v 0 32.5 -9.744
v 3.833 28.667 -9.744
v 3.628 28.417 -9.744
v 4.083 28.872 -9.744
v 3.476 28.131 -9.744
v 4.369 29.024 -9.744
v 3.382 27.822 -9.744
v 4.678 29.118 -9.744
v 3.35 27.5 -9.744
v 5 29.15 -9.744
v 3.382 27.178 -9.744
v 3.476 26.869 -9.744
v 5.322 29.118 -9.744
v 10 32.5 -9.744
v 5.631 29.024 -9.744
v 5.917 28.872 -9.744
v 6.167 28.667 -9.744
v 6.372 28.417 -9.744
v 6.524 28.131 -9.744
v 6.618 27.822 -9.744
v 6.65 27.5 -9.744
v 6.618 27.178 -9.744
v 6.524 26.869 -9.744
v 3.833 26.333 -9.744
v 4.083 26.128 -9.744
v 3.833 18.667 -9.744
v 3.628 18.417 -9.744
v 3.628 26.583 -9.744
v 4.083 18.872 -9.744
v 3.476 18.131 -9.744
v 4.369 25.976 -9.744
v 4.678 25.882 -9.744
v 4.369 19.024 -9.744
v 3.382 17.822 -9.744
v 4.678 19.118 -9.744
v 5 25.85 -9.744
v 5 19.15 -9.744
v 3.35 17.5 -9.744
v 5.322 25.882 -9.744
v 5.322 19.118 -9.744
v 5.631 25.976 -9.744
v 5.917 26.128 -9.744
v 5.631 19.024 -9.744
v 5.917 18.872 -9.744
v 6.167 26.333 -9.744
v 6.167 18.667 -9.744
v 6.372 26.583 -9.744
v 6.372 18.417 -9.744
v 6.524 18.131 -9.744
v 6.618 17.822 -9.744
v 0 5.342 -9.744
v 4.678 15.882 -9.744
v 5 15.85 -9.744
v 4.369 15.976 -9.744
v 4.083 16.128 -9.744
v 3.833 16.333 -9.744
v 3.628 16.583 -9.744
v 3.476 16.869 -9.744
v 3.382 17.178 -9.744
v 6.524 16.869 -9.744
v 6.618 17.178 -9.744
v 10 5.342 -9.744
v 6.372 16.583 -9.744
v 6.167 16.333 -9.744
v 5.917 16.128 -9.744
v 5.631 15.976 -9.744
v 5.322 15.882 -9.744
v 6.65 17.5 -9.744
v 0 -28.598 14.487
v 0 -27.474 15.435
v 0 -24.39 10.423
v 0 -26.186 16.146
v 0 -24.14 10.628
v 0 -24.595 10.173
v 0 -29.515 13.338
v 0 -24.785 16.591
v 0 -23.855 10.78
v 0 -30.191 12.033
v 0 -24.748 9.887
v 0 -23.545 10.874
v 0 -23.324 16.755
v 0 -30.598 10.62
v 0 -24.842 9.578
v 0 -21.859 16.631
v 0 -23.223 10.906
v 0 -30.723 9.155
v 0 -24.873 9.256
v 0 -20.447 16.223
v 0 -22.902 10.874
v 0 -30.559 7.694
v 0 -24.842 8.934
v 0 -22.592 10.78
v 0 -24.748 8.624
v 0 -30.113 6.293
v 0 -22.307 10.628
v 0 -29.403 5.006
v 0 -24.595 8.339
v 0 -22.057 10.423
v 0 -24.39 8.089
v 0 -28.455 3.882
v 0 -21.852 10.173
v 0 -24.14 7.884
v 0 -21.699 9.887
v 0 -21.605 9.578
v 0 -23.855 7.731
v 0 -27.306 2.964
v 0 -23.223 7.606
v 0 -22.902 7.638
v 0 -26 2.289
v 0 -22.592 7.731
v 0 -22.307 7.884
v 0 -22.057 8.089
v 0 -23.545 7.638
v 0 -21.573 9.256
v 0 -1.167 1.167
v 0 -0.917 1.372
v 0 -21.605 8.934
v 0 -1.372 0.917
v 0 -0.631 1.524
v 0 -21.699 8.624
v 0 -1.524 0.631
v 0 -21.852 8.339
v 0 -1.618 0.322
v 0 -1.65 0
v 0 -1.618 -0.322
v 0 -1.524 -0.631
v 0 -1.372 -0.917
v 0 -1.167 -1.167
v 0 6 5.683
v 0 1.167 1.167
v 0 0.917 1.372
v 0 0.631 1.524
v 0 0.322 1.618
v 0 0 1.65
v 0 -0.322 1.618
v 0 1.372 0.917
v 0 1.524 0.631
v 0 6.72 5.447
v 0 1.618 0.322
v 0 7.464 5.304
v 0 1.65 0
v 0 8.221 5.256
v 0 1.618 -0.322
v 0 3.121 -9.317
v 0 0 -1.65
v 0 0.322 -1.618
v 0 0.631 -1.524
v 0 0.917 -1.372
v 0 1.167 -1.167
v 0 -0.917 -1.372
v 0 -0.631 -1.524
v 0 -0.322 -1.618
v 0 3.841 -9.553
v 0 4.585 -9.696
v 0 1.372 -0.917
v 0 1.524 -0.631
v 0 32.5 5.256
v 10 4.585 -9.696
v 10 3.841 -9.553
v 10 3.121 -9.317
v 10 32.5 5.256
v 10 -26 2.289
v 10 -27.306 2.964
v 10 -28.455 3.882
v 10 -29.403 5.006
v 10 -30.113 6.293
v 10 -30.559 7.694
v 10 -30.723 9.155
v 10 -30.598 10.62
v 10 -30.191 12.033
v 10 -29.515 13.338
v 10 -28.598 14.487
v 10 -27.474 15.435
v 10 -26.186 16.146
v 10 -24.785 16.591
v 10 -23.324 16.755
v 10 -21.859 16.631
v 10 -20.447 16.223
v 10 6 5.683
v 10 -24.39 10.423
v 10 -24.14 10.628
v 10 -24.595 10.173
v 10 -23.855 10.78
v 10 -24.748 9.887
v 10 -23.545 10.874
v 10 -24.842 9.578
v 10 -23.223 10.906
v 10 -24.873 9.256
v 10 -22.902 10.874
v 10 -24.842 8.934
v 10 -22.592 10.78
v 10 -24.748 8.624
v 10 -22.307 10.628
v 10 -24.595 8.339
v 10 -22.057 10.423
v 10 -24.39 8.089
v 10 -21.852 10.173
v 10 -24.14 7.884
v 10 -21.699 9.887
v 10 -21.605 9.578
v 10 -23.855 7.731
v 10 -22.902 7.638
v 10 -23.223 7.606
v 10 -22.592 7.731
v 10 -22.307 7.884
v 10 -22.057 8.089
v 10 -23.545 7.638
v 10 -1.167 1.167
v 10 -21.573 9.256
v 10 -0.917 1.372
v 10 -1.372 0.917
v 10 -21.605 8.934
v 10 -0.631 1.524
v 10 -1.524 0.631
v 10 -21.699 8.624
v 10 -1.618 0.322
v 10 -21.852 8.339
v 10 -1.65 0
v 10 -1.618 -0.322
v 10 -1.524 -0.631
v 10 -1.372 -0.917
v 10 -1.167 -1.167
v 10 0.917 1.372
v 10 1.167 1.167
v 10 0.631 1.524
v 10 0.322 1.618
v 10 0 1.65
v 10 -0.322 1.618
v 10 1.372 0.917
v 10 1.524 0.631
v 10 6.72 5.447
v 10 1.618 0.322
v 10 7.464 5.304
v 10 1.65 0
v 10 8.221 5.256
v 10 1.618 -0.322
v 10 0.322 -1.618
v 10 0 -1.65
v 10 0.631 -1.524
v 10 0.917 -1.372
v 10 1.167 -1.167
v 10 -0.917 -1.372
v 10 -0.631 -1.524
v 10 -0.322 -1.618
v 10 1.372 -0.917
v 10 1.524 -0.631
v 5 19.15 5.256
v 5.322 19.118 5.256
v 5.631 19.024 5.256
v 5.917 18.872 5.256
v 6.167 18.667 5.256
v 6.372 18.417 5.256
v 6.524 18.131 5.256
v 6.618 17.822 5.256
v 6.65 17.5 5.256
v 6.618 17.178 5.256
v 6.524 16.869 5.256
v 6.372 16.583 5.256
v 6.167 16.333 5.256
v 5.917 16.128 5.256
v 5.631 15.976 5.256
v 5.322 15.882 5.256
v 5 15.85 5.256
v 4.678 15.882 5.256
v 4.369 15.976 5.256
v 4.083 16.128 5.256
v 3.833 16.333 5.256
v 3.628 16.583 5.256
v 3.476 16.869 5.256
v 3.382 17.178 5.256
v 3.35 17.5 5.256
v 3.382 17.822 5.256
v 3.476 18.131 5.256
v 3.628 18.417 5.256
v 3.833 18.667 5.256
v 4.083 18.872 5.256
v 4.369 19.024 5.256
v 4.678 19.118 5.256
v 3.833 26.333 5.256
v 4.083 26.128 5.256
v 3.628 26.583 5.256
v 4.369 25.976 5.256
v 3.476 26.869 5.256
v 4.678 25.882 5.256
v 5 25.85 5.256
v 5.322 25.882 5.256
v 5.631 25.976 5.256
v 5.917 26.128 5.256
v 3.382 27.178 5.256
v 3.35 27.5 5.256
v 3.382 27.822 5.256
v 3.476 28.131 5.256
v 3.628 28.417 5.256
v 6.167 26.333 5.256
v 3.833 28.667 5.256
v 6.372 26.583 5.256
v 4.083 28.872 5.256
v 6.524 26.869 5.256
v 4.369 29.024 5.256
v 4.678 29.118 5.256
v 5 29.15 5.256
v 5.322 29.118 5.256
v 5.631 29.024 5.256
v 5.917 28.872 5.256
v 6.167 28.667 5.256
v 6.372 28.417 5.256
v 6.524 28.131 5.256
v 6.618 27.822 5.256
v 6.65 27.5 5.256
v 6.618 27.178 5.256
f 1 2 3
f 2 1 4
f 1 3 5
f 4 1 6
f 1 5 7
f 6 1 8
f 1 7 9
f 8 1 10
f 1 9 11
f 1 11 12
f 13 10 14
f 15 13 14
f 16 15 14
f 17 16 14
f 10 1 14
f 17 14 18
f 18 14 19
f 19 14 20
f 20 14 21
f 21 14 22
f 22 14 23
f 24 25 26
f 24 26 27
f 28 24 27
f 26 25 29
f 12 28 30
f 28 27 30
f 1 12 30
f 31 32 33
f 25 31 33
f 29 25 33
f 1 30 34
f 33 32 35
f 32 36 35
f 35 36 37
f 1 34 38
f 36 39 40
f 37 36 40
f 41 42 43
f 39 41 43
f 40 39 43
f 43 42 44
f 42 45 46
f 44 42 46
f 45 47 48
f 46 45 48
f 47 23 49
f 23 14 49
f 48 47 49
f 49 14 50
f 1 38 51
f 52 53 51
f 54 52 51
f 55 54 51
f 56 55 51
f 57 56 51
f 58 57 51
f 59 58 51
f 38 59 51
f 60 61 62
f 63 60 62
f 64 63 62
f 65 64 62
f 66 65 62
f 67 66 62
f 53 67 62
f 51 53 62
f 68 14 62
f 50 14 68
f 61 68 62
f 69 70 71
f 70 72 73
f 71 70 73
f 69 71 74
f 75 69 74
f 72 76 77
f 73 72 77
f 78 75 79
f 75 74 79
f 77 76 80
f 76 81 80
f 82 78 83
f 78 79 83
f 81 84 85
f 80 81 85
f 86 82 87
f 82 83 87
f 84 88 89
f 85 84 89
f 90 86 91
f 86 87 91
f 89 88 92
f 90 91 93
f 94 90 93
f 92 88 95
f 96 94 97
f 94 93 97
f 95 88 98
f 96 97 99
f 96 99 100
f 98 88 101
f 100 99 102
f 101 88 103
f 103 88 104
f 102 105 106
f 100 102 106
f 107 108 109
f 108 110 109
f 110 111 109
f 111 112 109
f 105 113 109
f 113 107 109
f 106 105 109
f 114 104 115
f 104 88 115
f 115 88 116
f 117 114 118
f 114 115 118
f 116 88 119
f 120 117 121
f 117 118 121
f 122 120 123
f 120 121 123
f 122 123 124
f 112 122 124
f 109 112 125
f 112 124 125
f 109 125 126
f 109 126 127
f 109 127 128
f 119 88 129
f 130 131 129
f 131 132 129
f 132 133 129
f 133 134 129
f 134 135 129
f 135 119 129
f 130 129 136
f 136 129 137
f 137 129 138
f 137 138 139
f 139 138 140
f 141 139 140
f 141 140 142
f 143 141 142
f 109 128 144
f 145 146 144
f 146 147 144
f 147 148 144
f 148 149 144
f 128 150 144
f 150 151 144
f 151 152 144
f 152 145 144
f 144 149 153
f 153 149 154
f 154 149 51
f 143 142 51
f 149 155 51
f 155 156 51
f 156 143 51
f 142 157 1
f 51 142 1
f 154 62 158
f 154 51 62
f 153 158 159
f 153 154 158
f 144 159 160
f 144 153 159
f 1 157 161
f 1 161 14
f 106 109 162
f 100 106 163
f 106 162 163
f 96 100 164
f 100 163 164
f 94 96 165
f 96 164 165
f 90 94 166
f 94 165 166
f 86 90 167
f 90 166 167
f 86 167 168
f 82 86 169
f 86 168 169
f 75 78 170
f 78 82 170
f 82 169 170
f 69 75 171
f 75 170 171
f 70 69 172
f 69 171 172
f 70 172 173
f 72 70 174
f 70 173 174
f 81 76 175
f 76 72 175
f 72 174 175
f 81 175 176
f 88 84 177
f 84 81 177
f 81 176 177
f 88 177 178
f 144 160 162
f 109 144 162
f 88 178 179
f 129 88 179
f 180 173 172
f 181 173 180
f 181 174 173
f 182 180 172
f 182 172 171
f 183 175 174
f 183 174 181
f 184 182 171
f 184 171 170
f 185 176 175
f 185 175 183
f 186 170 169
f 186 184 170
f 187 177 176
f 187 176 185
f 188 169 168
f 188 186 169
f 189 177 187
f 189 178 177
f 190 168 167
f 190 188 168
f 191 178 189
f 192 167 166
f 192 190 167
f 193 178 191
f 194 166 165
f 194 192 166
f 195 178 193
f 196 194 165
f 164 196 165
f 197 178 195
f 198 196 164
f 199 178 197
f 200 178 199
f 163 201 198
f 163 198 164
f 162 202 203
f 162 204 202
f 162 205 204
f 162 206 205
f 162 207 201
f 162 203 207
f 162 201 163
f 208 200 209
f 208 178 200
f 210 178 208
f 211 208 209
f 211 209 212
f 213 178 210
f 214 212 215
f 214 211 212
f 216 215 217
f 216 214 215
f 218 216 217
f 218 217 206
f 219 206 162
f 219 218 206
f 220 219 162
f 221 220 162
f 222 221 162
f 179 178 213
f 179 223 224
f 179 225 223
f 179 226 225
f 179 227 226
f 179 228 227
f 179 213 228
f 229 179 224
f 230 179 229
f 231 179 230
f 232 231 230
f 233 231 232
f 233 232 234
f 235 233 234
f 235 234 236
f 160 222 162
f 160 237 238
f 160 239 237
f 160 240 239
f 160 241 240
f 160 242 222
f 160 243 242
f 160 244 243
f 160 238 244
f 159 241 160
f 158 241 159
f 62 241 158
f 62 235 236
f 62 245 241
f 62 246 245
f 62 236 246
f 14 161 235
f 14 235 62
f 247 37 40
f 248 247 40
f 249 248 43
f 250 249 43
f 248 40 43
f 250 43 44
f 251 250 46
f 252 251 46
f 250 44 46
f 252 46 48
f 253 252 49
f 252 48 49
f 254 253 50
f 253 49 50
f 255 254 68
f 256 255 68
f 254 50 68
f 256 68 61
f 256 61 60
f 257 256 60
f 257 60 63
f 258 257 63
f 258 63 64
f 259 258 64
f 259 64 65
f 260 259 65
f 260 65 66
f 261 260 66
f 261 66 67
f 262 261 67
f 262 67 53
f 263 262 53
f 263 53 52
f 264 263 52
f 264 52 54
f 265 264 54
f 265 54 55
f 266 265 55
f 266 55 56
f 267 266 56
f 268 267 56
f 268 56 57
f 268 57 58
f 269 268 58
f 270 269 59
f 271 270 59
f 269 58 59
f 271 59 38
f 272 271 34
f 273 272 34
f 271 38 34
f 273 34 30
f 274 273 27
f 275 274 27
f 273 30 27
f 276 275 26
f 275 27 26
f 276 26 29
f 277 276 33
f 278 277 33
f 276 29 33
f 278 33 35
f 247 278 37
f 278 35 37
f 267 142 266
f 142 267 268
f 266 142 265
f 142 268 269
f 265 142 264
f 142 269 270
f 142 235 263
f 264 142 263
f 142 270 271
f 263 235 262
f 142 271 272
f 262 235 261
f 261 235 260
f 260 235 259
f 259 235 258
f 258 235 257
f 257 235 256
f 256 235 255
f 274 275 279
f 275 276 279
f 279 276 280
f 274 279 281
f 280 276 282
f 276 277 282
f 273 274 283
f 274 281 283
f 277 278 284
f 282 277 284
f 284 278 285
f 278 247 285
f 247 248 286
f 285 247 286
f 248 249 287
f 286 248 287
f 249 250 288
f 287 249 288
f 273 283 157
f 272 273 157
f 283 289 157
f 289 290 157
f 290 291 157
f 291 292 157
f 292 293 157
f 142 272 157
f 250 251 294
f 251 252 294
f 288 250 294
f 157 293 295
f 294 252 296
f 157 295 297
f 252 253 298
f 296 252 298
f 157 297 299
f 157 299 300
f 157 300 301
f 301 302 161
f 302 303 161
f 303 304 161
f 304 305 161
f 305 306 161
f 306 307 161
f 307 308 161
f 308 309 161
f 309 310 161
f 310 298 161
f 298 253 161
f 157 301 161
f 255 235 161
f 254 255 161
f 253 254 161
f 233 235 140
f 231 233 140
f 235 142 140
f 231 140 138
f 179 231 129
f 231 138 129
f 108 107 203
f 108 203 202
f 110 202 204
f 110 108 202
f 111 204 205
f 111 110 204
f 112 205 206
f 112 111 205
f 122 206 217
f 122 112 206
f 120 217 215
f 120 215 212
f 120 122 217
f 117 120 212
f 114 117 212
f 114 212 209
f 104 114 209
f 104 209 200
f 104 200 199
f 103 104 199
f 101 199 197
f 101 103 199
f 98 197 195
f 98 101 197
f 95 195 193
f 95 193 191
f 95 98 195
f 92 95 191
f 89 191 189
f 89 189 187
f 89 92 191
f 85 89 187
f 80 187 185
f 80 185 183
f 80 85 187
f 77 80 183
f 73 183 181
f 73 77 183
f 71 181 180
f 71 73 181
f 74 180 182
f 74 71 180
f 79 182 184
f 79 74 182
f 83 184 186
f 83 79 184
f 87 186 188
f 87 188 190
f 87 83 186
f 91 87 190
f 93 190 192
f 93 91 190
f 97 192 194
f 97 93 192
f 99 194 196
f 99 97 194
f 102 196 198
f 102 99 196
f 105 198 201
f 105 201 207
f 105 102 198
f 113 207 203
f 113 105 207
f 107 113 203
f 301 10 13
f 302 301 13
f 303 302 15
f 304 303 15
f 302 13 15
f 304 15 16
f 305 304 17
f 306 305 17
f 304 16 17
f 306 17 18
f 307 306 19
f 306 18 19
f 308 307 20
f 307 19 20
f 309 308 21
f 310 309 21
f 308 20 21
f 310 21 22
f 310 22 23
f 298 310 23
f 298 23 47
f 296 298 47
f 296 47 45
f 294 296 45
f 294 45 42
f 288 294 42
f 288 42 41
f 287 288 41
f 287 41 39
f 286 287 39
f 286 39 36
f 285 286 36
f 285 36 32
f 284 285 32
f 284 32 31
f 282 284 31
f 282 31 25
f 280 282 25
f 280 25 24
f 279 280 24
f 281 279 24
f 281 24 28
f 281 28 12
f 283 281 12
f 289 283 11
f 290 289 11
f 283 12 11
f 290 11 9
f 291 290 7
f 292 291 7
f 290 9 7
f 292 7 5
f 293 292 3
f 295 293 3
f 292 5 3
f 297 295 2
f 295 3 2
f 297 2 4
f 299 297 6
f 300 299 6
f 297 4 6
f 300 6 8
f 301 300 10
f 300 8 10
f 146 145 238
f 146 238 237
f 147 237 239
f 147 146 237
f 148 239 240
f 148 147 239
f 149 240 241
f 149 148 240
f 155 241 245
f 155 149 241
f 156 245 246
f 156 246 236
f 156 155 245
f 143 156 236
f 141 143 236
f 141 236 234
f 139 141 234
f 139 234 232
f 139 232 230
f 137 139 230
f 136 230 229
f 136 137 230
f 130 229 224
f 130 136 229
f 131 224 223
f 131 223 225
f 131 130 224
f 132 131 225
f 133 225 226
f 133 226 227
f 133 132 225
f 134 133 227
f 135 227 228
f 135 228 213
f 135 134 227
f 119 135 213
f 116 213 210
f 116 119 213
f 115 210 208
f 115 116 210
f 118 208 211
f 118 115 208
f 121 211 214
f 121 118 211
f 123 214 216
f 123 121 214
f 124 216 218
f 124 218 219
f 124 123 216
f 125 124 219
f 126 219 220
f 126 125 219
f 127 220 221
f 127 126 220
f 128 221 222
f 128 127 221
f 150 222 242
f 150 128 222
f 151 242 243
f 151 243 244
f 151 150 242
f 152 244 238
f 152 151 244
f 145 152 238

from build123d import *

# Parameters (mm, degrees)
SKETCH_1_W          = 64.494727868
SKETCH_1_H          = 65
SKETCH_1_R          = 1.65
EXTRUDE_1_DEPTH     = 10
SKETCH_2_R          = 1.65
CUT_EXTRUDE_1_DEPTH = 47.863018263
SKETCH_3_R          = 1.65
CUT_EXTRUDE_2_DEPTH = 44.110090197
FILLET_1_R          = 6


with BuildPart() as part:
    # ｽｹｯﾁ1 → ﾎﾞｽ - 押し出し1 (new body)
    with BuildSketch(Plane(origin=(0, 0, 0), x_dir=(0, 0, -1), z_dir=(1, 0, 0))):
        Rectangle(SKETCH_1_W, SKETCH_1_H)
        Circle(SKETCH_1_R, mode=Mode.SUBTRACT)
        with Locations((-9.255829981, -23.223471131)):
            Circle(SKETCH_1_R, mode=Mode.SUBTRACT)
        with Locations((-22.247363934, -11.404157049)):
            Circle(SKETCH_1_R, mode=Mode.SUBTRACT)
    extrude(amount=EXTRUDE_1_DEPTH)

    # ｽｹｯﾁ2 → ｶｯﾄ - 押し出し1 (cut, through all)
    with BuildSketch(Plane(origin=(10, 0, 0), x_dir=(0, 0, -1), z_dir=(1, 0, 0))):
        with BuildLine():
            Line((9.743790334, 32.5), (9.743790334, 4.190292345))
            Line((9.743790334, 4.190292345), (-2.288788642, -26.000220125))
            ThreePointArc((-2.288788642, -26.000220125), (-12.032578975, -30.19051247), (-16.22287132, -20.446722136))
            Line((-16.22287132, -20.446722136), (-5.256209666, 7.069335401))
            Line((-5.256209666, 7.069335401), (-5.256209666, 32.5))
            Line((-5.256209666, 32.5), (-32.247363934, 32.5))
            Line((-32.247363934, 32.5), (-32.247363934, -32.5))
            Line((-32.247363934, -32.5), (32.247363934, -32.5))
            Line((32.247363934, -32.5), (32.247363934, 32.5))
            Line((32.247363934, 32.5), (9.743790334, 32.5))
        make_face()
        with Locations((-22.247363934, -11.404157049)):
            Circle(SKETCH_2_R, mode=Mode.SUBTRACT)
    extrude(amount=-CUT_EXTRUDE_1_DEPTH, mode=Mode.SUBTRACT)

    # ｽｹｯﾁ3 → ｶｯﾄ - 押し出し2 (cut, through all)
    with BuildSketch(Plane(origin=(0, 0, -9.743790334), x_dir=(-1, 0, 0), z_dir=(0, 0, -1))):
        with Locations(Location((-5, 27.5, 0), (0, 0, 90))):
            Circle(SKETCH_3_R)
        with Locations(Location((-5, 17.5, 0), (0, 0, 90))):
            Circle(SKETCH_3_R)
    extrude(amount=-CUT_EXTRUDE_2_DEPTH, mode=Mode.SUBTRACT)

    # ﾌｨﾚｯﾄ1
    fillet_1_edges = [part.edges().sort_by_distance(p)[0] for p in [
        (5, 7.069335401, 5.256209666),
        (5, 4.190292345, -9.743790334),
    ]]
    fillet(fillet_1_edges, radius=FILLET_1_R)


solid = part.part
